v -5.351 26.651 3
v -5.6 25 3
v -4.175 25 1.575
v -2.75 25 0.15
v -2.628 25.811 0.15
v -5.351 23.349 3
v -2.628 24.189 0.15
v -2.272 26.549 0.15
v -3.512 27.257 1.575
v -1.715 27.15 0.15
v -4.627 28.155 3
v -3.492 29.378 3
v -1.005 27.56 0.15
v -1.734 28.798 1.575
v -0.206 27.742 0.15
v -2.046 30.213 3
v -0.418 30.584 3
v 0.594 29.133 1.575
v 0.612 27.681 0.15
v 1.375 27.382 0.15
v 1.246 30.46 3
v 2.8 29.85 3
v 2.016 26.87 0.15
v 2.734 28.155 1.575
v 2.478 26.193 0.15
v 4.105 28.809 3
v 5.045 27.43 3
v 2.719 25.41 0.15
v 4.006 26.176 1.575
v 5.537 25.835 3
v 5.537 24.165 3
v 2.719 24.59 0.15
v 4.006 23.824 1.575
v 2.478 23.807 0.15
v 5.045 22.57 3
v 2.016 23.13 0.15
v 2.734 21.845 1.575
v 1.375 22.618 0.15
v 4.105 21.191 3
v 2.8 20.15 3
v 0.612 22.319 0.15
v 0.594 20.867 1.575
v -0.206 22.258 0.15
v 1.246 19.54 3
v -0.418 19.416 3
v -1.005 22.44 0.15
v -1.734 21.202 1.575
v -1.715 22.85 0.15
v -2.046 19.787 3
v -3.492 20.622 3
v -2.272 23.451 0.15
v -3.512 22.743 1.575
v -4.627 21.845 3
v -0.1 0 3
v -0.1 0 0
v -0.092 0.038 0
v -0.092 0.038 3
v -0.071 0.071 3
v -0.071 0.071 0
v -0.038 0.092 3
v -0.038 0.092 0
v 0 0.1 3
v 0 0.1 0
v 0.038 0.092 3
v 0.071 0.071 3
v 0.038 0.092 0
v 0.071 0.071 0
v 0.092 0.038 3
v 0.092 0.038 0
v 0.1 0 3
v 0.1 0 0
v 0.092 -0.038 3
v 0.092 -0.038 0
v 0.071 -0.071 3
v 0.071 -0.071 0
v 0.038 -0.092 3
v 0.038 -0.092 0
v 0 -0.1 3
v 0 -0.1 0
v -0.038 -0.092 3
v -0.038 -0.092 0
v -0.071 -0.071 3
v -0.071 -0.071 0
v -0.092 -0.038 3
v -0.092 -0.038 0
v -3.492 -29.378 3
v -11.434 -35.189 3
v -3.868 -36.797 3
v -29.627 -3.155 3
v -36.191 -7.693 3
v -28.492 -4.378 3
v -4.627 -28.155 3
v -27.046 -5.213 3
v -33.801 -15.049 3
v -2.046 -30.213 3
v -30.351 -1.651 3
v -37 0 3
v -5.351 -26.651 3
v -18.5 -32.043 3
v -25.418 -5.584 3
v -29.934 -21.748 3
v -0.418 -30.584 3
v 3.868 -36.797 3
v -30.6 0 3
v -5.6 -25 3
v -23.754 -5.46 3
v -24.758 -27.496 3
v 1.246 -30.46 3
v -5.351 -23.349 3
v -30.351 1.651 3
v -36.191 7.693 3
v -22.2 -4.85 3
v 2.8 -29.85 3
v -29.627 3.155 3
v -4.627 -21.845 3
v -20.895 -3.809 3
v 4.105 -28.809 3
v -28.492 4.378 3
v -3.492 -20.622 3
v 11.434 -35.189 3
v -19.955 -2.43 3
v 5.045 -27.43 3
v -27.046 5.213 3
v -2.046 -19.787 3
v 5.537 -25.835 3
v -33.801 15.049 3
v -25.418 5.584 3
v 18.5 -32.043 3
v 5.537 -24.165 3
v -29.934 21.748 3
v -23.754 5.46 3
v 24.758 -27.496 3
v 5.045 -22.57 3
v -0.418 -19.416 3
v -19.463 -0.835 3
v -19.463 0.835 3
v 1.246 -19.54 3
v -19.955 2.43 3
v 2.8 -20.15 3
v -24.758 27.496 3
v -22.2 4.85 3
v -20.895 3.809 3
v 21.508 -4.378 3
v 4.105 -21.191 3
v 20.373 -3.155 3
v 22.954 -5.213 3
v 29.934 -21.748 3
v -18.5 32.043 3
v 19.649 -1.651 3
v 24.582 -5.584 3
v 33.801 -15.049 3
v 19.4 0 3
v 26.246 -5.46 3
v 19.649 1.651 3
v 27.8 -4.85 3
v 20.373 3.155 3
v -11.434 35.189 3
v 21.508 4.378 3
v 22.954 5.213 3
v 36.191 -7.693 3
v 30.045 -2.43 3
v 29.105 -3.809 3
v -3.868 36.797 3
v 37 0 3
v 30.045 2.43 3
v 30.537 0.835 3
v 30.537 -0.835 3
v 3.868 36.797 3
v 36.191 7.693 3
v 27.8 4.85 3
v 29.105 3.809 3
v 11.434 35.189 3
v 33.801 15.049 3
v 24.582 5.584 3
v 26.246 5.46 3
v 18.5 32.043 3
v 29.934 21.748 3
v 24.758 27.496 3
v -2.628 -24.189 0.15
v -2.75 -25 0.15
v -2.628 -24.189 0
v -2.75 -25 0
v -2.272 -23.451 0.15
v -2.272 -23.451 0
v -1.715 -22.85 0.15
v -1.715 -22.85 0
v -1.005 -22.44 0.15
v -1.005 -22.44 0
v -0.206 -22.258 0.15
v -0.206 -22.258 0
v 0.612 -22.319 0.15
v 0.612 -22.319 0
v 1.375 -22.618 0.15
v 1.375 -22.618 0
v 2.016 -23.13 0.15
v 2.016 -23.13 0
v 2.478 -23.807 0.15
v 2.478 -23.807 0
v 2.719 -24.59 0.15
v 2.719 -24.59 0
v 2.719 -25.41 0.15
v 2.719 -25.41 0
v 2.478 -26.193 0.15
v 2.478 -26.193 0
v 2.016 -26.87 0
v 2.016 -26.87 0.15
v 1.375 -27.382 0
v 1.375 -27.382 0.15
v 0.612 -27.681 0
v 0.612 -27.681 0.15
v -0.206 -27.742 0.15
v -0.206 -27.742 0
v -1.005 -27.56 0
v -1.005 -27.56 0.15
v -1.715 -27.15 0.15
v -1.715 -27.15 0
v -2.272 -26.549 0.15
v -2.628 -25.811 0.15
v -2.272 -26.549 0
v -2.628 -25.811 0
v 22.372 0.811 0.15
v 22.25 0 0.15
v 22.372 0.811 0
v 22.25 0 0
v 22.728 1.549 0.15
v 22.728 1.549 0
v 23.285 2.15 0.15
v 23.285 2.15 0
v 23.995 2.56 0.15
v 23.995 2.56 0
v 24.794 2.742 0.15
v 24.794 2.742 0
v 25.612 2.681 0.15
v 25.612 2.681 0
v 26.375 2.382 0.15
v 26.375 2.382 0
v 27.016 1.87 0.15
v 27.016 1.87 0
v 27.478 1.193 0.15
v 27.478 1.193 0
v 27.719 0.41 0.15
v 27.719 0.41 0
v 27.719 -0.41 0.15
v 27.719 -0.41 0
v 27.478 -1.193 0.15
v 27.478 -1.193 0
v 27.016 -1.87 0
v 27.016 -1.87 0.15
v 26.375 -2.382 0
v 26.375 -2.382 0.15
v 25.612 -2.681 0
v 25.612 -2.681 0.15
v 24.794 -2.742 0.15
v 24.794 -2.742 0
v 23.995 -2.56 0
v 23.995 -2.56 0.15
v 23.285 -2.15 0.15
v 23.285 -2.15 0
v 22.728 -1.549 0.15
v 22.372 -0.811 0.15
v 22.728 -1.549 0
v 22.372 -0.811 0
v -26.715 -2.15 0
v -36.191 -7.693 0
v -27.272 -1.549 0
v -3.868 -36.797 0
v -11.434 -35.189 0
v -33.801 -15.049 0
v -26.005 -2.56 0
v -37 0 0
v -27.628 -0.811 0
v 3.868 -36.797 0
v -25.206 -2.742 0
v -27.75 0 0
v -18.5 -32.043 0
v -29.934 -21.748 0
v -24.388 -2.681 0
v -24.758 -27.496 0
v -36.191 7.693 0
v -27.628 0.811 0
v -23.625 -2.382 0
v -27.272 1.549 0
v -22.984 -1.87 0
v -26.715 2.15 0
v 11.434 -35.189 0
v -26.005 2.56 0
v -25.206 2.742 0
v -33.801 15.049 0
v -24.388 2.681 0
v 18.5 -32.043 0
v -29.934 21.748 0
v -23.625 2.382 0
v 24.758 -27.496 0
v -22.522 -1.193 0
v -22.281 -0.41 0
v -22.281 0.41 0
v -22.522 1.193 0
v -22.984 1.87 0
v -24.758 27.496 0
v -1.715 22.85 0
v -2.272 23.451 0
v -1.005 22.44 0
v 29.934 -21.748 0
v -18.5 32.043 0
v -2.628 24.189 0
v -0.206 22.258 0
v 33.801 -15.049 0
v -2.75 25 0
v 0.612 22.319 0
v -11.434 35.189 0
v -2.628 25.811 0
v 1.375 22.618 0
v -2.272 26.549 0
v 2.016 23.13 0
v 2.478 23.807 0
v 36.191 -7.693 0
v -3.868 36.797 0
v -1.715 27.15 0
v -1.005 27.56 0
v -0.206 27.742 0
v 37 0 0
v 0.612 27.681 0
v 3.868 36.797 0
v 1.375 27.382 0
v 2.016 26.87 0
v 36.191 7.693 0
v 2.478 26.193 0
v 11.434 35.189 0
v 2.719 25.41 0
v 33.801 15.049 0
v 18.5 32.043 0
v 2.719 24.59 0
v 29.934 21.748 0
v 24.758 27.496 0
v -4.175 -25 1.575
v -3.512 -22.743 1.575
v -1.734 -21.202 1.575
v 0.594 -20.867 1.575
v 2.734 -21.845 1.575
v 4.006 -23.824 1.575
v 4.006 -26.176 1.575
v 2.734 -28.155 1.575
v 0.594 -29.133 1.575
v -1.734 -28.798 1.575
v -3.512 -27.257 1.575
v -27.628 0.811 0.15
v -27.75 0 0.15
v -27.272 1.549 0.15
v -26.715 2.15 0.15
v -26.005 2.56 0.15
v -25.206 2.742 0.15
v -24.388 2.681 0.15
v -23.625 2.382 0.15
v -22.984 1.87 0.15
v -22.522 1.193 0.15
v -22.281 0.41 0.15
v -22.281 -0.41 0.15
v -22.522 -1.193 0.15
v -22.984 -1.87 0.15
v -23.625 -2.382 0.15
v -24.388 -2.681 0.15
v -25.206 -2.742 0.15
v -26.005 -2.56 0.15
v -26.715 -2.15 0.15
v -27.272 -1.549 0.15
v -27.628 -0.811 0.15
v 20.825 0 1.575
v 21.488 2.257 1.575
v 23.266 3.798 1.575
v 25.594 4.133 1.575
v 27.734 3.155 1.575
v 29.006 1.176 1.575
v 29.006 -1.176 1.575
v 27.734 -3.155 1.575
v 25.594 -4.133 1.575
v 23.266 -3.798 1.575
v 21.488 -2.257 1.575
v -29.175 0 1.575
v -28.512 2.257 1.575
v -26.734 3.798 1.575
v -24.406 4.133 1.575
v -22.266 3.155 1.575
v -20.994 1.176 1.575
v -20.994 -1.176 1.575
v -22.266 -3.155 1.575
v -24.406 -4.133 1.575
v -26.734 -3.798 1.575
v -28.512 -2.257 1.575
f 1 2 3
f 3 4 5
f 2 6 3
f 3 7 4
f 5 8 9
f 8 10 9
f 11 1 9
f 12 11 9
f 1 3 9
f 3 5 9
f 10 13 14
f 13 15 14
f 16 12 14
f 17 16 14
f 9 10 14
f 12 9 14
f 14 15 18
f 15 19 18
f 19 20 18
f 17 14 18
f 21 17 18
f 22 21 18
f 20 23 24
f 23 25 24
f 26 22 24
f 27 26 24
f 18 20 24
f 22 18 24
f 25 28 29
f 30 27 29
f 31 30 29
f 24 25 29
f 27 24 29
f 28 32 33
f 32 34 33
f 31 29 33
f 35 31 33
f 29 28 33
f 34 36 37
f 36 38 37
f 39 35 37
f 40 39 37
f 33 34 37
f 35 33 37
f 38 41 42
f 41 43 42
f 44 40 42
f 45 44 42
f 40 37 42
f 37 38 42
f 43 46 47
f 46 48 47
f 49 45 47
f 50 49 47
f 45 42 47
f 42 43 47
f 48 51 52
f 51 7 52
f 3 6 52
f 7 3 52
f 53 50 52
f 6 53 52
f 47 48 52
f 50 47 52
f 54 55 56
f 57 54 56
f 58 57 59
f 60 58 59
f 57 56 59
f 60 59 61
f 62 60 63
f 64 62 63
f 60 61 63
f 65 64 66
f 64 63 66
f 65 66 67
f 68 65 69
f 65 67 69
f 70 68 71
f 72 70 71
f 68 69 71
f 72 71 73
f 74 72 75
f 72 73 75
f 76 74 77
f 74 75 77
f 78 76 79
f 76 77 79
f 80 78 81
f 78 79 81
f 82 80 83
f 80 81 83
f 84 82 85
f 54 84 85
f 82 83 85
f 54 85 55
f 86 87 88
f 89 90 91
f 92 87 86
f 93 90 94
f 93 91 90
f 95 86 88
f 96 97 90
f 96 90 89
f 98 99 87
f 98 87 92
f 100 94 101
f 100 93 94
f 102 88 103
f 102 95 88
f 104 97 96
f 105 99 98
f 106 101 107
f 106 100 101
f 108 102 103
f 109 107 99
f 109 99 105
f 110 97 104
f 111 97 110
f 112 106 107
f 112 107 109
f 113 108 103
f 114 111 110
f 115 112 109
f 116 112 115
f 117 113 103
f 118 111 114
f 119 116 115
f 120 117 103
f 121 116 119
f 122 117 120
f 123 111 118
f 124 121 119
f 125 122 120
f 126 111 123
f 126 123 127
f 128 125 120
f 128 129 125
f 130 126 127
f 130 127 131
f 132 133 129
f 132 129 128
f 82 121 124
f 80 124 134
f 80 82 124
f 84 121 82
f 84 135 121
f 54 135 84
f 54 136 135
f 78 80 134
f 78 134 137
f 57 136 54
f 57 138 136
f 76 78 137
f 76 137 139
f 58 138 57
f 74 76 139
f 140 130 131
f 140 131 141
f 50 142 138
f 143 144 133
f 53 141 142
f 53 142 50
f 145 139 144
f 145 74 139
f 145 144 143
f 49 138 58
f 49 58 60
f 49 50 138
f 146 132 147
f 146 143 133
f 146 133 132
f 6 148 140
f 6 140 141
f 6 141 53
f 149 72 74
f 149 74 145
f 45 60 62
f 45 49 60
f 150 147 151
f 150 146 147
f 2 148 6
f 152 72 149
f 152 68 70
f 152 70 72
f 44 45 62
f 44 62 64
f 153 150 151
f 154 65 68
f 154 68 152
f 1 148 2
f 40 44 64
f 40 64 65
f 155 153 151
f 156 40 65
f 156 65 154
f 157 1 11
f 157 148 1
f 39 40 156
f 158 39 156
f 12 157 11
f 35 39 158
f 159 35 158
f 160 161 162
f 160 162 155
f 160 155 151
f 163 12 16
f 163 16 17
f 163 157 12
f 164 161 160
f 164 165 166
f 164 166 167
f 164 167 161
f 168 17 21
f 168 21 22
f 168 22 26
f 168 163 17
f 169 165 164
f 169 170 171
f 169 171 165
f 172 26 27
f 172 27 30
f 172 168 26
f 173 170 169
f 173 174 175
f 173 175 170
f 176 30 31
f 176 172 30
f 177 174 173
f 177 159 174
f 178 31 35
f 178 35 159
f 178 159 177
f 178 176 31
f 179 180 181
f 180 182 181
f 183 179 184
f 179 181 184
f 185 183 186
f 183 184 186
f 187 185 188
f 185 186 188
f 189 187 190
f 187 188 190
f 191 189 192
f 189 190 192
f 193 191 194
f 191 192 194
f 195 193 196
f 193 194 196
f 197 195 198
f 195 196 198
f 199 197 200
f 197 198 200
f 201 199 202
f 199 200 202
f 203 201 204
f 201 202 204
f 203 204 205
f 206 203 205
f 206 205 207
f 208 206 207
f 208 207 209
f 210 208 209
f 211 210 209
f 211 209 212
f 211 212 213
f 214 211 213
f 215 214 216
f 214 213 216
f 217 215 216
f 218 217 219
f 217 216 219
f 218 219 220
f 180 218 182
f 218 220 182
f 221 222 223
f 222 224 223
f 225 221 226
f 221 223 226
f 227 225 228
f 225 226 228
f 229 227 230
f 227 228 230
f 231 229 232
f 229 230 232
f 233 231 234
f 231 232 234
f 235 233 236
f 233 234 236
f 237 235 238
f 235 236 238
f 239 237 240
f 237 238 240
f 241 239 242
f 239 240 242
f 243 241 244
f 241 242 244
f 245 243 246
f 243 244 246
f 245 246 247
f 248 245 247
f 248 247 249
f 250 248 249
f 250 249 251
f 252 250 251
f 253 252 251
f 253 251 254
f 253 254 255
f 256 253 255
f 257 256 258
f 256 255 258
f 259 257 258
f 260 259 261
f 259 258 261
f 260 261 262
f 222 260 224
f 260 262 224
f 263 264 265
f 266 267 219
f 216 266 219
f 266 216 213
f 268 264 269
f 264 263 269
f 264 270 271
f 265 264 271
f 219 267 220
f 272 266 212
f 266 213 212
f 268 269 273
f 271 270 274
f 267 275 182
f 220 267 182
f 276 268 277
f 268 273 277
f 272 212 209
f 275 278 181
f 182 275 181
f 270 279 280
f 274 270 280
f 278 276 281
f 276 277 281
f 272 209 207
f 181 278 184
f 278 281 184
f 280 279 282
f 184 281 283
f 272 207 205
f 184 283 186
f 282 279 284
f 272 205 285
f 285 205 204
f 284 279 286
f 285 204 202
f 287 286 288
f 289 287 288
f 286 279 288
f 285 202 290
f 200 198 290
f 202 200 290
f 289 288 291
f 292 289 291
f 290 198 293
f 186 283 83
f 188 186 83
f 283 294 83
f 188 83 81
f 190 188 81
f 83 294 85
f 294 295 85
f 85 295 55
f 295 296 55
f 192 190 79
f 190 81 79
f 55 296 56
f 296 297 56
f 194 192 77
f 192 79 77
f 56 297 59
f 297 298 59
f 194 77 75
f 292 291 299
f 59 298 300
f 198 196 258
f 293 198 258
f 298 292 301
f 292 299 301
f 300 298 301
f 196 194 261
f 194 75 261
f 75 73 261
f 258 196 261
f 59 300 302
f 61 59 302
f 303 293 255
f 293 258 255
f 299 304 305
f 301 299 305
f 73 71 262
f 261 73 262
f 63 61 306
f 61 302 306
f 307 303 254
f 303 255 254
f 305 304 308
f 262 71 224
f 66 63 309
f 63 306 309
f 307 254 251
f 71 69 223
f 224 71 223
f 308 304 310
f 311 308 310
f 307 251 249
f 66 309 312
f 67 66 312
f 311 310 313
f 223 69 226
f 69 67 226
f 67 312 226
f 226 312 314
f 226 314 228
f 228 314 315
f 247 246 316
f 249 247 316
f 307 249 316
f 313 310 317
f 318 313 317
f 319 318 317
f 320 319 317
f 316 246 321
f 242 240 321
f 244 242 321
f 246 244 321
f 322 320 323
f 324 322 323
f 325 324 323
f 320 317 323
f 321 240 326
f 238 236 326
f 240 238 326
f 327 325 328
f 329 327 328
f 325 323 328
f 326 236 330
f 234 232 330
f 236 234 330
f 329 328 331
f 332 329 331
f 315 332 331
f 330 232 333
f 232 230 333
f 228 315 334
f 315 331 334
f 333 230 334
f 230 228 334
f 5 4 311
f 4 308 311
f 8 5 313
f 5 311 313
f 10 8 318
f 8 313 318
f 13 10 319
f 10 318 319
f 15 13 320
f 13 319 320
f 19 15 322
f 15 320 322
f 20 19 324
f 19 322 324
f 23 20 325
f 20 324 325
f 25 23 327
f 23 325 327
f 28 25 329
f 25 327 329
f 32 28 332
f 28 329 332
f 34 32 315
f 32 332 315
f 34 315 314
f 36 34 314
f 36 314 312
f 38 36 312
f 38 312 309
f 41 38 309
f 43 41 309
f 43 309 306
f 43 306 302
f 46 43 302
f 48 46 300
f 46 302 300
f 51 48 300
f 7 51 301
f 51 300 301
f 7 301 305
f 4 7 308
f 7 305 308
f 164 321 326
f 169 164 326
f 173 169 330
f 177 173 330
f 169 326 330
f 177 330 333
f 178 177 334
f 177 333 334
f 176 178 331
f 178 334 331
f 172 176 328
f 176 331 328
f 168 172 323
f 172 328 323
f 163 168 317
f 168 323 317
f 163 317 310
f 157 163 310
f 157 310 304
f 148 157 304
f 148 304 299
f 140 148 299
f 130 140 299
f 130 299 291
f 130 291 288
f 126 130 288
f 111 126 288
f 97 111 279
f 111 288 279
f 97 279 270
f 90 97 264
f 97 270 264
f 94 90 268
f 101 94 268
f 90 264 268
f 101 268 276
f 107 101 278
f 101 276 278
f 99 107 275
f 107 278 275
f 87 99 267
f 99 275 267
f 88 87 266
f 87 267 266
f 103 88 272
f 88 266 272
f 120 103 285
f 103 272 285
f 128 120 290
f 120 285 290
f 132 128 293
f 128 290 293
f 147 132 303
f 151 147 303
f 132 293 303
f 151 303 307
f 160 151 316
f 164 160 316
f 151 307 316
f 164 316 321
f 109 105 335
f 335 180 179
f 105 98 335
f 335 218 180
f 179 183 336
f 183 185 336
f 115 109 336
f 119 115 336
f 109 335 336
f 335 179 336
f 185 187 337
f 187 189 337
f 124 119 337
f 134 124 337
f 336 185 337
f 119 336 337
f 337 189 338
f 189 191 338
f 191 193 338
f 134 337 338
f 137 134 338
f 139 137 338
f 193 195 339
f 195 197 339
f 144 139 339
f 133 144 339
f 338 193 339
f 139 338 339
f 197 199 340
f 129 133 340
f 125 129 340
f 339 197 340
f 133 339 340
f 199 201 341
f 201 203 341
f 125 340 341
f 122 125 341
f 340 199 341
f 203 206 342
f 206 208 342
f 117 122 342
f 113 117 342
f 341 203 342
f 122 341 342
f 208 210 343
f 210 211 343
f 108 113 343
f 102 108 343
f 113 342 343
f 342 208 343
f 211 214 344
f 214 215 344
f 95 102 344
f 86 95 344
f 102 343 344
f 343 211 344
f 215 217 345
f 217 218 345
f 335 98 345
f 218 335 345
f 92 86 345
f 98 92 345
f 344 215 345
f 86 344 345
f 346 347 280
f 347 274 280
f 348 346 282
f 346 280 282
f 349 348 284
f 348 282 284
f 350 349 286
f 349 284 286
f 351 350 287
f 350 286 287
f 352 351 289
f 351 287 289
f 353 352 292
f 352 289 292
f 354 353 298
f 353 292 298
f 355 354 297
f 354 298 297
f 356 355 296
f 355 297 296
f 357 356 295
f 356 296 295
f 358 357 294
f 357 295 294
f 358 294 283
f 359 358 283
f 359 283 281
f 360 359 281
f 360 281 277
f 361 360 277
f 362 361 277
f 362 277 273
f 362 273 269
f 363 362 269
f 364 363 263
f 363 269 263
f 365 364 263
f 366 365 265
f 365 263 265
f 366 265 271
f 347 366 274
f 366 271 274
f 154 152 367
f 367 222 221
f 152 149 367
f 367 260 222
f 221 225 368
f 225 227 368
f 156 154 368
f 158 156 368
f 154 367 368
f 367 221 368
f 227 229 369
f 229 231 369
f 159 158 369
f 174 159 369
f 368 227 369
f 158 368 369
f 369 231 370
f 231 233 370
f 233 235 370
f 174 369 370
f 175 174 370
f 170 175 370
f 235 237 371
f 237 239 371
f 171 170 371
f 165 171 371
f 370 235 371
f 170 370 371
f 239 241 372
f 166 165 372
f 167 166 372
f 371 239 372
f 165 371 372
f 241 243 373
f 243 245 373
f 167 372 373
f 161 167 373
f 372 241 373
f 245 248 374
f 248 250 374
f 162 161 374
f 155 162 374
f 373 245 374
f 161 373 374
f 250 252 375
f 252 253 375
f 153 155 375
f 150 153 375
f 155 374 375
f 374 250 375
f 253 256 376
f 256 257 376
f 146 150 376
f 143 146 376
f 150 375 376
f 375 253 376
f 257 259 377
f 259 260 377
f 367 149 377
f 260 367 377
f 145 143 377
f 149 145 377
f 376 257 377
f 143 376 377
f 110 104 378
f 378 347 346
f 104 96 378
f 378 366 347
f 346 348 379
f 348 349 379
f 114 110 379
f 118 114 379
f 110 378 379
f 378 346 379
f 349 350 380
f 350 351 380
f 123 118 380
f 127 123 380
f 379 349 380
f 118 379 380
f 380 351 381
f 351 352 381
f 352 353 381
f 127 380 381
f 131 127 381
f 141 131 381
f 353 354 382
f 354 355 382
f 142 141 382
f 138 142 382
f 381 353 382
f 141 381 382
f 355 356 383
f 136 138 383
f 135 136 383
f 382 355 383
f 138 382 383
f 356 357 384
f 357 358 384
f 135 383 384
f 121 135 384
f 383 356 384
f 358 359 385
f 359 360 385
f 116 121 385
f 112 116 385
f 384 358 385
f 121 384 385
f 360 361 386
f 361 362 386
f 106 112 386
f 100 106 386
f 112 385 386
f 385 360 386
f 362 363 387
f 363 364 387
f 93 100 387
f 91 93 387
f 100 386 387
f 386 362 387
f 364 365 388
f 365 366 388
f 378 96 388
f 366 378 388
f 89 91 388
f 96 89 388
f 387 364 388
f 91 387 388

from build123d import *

# Parameters (mm, degrees)
F0_R           = 37
F1_DEPTH       = 3
F3_D           = 5.5
F3_DEPTH       = 15
F3_CSINK_D     = 11.2
F3_CSINK_ANGLE = 90
F3_TIP         = 1.6523667023
F5_D           = 0.2


with BuildPart() as f1:
    # F0 (on Top) → F1 (new body)
    with BuildSketch(Plane.XY):
        Circle(F0_R)
    extrude(amount=F1_DEPTH)

    # F3
    with Locations(Plane.XY.offset(3)):
        with Locations((0, 25), (-25, 0), (0, -25), (25, 0)):
            CounterSinkHole(F3_D / 2, F3_CSINK_D / 2, depth=F3_DEPTH, counter_sink_angle=F3_CSINK_ANGLE)
            with Locations((0, 0, -(F3_DEPTH + F3_TIP / 2))):  # 118° drill point
                Cone(0, F3_D / 2, F3_TIP, mode=Mode.SUBTRACT)

    # F5 (through all)
    with Locations(Plane.XY.offset(3)):
        with Locations((0, 0)):
            Hole(F5_D / 2)


solid = f1.part
